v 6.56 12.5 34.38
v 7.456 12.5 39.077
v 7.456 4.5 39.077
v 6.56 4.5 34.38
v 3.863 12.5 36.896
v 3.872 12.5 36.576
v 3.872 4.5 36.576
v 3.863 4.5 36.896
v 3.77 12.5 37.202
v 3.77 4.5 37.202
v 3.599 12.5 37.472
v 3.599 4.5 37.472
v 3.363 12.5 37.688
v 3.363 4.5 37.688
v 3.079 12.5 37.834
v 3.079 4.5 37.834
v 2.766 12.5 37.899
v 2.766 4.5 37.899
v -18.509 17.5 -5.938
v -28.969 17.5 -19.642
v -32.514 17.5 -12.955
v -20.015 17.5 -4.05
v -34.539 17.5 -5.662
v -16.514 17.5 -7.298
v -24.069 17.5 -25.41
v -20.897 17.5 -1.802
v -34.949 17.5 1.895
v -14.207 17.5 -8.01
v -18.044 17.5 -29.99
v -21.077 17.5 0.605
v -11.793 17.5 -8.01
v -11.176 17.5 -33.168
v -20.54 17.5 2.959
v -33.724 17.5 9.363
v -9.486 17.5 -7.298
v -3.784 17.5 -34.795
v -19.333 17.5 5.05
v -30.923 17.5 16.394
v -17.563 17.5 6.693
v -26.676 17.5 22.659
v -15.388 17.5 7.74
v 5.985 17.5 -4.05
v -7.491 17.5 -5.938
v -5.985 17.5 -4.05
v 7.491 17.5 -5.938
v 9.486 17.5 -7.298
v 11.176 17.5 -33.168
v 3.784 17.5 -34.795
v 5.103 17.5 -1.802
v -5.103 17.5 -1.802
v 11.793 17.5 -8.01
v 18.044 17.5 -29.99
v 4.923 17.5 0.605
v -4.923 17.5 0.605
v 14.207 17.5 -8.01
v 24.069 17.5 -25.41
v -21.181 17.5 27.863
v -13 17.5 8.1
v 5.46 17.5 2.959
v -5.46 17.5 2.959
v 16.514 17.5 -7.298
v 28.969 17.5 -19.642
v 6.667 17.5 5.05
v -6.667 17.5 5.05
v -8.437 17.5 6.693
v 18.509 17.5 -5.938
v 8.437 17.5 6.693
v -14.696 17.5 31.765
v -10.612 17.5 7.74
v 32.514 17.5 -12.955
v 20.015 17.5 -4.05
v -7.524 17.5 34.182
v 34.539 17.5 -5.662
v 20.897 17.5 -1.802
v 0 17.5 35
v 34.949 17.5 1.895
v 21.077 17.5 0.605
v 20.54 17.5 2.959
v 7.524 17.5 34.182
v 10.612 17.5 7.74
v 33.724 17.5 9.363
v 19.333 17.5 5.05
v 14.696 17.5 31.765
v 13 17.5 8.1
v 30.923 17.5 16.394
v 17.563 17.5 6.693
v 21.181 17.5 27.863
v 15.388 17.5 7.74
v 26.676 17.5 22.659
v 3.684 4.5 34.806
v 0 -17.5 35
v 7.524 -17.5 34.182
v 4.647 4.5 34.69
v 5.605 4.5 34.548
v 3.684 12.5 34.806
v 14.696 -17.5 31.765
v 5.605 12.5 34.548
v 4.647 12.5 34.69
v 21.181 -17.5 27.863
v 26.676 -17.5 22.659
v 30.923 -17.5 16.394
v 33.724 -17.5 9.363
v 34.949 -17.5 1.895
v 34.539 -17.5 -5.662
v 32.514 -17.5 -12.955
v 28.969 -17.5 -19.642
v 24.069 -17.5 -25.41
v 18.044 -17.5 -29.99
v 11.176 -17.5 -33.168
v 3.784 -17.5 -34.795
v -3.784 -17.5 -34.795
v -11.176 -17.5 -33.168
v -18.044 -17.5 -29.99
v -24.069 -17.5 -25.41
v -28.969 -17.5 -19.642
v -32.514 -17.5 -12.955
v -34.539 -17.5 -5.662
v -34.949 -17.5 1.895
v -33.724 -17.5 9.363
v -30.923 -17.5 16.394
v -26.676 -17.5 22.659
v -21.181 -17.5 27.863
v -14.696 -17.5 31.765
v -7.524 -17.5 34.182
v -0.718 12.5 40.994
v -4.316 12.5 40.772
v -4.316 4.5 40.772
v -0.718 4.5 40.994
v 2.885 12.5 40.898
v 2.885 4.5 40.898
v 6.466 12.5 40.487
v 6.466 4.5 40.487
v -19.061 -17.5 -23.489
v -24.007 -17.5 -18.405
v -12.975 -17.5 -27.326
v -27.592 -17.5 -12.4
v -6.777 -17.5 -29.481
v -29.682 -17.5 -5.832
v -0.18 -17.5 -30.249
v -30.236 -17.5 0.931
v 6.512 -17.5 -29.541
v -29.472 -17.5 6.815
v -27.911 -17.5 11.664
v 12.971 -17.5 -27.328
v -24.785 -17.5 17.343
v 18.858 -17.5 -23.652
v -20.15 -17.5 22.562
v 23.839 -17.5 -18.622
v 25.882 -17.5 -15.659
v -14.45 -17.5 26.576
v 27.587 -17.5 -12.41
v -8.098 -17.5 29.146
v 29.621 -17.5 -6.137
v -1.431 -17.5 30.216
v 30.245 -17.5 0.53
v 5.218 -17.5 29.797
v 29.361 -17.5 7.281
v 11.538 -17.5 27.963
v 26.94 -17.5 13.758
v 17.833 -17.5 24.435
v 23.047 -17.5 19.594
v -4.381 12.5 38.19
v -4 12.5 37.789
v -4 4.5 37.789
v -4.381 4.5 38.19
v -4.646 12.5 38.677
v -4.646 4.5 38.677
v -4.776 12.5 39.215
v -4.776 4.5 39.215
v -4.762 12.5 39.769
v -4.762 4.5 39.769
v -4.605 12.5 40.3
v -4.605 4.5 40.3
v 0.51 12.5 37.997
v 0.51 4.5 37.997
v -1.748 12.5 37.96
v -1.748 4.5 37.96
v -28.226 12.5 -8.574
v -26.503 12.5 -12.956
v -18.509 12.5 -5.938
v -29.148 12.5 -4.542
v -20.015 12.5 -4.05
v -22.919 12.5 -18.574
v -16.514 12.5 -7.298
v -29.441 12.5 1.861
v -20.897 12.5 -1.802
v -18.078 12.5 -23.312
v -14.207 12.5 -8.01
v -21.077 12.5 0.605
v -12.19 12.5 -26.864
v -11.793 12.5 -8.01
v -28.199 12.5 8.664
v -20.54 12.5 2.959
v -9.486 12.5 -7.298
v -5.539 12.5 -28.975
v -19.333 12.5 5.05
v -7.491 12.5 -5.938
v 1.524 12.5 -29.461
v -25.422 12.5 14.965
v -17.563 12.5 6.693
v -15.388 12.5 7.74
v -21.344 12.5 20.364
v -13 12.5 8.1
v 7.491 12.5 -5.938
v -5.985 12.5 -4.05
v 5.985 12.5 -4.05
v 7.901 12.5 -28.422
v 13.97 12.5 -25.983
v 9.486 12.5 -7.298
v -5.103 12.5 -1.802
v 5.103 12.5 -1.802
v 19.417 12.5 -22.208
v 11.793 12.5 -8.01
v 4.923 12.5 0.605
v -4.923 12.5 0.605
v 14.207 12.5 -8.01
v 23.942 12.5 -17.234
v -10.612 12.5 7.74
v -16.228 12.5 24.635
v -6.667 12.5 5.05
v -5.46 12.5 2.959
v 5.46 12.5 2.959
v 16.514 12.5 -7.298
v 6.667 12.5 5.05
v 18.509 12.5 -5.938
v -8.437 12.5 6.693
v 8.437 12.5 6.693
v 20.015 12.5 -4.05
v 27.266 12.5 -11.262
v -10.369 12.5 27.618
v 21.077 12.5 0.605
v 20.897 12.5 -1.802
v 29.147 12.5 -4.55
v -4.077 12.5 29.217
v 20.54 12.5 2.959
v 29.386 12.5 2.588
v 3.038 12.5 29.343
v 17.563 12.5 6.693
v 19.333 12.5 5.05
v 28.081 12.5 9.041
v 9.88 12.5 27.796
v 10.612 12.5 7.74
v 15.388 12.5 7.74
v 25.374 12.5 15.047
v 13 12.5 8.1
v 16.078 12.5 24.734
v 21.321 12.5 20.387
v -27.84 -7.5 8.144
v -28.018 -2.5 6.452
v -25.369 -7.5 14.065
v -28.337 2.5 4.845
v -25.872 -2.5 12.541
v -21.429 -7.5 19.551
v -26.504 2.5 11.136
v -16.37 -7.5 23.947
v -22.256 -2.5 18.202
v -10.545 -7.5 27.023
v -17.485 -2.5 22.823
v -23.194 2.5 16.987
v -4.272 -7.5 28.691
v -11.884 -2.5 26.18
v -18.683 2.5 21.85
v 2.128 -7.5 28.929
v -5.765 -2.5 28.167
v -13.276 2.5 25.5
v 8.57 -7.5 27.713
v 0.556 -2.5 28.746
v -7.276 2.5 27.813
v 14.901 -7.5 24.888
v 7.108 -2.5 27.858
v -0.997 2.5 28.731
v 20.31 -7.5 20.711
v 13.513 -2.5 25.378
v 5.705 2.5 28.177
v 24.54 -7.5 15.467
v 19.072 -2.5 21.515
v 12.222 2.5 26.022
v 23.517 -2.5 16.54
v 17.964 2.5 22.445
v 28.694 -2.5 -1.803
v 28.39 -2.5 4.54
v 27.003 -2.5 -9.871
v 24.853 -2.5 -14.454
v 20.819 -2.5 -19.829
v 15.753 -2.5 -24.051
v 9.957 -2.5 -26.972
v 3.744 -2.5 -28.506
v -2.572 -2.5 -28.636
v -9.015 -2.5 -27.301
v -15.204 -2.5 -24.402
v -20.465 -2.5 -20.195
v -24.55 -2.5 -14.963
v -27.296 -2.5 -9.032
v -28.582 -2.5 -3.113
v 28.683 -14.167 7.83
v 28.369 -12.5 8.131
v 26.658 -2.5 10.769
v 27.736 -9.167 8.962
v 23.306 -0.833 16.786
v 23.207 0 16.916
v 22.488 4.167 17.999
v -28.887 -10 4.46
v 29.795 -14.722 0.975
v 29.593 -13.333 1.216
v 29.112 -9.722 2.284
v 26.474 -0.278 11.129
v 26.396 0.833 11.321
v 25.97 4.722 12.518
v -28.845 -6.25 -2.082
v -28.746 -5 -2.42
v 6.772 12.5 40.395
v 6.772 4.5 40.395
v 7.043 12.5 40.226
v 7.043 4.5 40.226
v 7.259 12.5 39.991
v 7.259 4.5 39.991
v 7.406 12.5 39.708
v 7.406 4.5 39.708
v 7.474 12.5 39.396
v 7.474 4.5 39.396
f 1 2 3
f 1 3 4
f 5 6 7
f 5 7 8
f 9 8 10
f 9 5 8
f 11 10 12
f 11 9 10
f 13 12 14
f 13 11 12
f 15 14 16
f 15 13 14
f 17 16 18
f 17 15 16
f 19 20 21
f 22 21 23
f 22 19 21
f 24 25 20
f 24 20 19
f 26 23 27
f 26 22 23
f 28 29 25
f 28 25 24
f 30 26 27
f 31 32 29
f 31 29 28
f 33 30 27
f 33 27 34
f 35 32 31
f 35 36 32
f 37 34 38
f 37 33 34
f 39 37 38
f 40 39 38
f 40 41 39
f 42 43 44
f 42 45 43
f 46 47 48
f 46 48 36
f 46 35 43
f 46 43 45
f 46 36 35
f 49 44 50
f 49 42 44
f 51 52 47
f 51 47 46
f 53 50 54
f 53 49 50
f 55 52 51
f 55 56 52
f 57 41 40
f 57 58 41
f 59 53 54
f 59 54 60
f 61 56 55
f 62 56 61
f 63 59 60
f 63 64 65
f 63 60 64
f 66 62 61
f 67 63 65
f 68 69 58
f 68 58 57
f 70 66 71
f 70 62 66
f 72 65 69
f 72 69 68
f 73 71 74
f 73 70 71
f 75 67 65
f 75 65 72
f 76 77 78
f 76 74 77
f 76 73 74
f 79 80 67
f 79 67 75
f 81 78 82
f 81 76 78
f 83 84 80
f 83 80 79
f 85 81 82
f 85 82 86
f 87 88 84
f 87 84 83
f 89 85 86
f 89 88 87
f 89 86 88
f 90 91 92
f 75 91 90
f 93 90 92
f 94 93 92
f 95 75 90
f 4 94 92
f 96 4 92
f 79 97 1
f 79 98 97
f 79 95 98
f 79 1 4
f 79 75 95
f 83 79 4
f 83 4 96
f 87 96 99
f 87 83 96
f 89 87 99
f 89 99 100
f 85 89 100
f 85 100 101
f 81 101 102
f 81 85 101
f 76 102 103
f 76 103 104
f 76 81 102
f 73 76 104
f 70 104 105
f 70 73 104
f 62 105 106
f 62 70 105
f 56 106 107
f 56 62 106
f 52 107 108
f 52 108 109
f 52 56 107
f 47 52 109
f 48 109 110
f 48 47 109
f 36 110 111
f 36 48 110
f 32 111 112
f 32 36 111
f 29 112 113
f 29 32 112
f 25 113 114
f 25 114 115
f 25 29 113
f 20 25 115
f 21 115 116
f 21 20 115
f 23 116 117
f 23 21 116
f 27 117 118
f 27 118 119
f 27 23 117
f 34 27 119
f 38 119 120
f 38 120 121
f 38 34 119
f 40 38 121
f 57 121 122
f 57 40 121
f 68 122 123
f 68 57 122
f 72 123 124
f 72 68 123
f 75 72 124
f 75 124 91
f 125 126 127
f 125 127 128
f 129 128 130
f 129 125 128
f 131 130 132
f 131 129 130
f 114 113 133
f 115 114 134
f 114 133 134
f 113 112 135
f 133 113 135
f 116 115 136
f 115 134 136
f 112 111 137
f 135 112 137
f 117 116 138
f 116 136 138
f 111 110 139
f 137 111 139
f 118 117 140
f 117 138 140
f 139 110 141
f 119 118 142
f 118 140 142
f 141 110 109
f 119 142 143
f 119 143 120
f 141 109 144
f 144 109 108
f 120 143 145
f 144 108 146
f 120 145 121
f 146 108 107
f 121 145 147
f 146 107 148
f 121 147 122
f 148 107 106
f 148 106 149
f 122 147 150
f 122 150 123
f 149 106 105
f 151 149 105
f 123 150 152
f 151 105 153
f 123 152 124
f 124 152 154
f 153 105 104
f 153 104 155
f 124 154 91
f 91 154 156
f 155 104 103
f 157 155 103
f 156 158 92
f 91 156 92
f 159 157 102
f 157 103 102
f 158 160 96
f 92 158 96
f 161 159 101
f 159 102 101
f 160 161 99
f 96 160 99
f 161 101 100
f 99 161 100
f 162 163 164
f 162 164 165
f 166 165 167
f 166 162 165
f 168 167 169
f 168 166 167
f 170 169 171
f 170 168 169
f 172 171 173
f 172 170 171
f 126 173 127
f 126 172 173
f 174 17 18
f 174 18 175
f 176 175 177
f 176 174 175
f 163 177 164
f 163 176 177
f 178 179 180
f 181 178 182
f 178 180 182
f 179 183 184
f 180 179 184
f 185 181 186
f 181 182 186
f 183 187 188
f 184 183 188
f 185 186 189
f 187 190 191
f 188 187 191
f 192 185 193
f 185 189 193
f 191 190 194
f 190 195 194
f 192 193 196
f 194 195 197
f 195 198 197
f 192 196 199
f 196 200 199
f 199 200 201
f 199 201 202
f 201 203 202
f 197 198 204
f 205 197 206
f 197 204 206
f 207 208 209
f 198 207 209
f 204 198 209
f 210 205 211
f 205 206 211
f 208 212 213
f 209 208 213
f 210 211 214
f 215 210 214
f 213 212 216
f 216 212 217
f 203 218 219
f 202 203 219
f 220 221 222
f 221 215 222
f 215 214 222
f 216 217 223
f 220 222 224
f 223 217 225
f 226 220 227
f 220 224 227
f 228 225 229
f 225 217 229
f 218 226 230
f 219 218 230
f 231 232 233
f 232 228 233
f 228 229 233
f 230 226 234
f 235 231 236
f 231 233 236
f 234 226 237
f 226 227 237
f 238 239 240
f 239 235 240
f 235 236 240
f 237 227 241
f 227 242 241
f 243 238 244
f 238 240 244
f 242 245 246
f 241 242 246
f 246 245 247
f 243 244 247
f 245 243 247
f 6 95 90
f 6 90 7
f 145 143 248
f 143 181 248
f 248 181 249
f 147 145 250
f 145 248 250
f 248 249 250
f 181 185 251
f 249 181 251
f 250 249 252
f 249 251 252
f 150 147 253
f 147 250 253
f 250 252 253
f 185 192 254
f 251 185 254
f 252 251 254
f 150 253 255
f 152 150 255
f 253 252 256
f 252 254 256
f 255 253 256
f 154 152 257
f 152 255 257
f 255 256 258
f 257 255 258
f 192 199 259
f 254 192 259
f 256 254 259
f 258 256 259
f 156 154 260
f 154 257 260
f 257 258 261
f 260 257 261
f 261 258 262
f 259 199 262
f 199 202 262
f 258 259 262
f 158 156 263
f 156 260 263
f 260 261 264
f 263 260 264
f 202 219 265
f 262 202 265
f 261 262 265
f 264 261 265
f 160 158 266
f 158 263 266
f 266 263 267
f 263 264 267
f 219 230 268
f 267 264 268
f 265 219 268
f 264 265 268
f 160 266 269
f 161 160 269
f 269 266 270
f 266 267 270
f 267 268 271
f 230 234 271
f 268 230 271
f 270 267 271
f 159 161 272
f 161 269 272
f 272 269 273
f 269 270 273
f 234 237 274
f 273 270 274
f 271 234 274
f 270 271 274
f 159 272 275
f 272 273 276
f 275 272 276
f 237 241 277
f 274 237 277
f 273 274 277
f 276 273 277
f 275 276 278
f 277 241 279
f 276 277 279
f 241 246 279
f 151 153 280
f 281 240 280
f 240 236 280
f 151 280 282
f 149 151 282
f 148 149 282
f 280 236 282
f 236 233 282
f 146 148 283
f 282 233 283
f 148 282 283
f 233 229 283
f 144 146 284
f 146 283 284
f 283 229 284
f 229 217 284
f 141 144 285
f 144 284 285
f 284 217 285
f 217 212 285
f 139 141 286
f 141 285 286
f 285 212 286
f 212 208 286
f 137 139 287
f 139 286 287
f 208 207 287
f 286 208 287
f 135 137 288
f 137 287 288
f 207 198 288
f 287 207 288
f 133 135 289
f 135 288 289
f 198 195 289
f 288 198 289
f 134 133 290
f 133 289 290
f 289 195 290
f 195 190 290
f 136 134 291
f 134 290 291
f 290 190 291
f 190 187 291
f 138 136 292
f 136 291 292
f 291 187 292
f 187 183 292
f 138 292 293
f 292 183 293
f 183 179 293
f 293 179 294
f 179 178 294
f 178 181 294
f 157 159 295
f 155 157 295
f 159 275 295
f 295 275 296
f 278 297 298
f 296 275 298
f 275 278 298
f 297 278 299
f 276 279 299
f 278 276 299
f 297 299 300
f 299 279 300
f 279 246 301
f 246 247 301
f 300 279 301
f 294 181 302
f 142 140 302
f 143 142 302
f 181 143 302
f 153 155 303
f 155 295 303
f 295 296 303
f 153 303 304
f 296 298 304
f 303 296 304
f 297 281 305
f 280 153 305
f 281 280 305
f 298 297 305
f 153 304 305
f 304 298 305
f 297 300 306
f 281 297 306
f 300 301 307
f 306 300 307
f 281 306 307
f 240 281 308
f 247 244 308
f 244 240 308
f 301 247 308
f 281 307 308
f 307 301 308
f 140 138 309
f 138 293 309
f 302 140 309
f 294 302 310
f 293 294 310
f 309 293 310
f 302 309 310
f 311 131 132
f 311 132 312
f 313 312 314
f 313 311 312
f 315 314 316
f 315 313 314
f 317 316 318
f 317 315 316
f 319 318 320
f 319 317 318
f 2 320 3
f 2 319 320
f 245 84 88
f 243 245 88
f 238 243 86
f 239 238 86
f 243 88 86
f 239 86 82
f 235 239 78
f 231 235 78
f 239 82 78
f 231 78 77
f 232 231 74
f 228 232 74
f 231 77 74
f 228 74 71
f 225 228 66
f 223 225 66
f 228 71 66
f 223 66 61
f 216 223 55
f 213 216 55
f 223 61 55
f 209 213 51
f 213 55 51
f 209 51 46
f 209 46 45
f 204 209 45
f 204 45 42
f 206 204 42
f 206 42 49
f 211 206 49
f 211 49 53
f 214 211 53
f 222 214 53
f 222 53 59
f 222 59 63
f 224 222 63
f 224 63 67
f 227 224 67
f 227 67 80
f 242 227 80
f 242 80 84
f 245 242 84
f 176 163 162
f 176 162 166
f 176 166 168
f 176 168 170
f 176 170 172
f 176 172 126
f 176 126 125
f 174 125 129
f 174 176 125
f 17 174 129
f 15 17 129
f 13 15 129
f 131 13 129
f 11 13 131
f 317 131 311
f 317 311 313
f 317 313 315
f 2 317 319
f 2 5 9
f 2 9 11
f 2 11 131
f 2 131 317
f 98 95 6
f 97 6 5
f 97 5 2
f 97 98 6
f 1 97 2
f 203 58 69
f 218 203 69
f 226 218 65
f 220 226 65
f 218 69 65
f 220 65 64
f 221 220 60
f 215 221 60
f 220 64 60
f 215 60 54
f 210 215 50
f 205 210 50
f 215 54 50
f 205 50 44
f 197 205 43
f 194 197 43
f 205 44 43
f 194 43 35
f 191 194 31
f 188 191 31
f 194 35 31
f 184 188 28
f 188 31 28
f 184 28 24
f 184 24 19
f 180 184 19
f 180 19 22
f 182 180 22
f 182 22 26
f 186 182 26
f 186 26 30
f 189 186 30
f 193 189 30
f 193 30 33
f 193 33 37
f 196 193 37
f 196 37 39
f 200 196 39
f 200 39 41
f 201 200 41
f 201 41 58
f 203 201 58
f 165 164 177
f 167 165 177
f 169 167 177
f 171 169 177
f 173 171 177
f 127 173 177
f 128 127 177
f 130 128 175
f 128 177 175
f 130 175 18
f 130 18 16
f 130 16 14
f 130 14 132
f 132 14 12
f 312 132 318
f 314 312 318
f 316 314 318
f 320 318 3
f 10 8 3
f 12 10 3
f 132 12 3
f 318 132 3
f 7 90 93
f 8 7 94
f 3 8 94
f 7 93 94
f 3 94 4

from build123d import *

# Parameters (mm, degrees)
ESBO_O1_R                = 35
RESSALTO_EXTRUS_O1_DEPTH = 17.5
ESBO_O2_R                = 8.1
CORTE_EXTRUS_O1_DEPTH    = 61.621778265
RESSALTO_EXTRUS_O2_DEPTH = 8


with BuildPart() as part:
    # Esboço1 → Ressalto-extrusão1 (new, symmetric)
    with BuildSketch(Plane(origin=(0, 0, 0), x_dir=(1, 0, 0), z_dir=(0, 1, 0))):
        with Locations(Location((0, 0, 0), (0, 0, 270))):
            Circle(ESBO_O1_R)
    extrude(amount=RESSALTO_EXTRUS_O1_DEPTH, both=True)

    # Esboço2 → Corte-extrusão1 (cut, through all)
    with BuildSketch(Plane(origin=(0, 17.5, 0), x_dir=(1, 0, 0), z_dir=(0, 1, 0))):
        with Locations(Location((-13, 0, 0), (0, 0, 270))):
            Circle(ESBO_O2_R)
        with Locations(Location((13, 0, 0), (0, 0, 270))):
            Circle(ESBO_O2_R)
    extrude(amount=-CORTE_EXTRUS_O1_DEPTH, mode=Mode.SUBTRACT)

    # Loft de corte1: read off the stored shape, not the designer's step
    # Loft de corte1: loft between two sections, ruled curve by curve
    loft_de_corte1_from = [
        Edge.make_bspline([(-27.910850381, -17.5, 11.663915766), (-4.583018848, -17.5, 67.485616529), (51.238681914, -17.5, 44.157784996), (27.910850381, -17.5, -11.663915766), (4.583018848, -17.5, -67.485616529), (-51.238681914, -17.5, -44.157784996), (-27.910850381, -17.5, 11.663915766)], [0, 0, 0, 0, 0.5, 0.5, 0.5, 1, 1, 1, 1], 3, [1, 0.333333333, 0.333333333, 1, 0.333333333, 0.333333333, 1]),
    ]
    loft_de_corte1_to = [
        Edge.make_bspline([(-29.148312313, 12.5, -4.54157344), (-38.231459193, 12.5, 53.755051185), (20.065165432, 12.5, 62.838198066), (29.148312313, 12.5, 4.54157344), (38.231459193, 12.5, -53.755051185), (-20.065165432, 12.5, -62.838198066), (-29.148312313, 12.5, -4.54157344)], [0, 0, 0, 0, 0.5, 0.5, 0.5, 1, 1, 1, 1], 3, [1, 0.333333333, 0.333333333, 1, 0.333333333, 0.333333333, 1]),
    ]
    loft_de_corte1 = Solid(Shell([*[Face.make_surface_from_curves(loft_de_corte1_from[k], loft_de_corte1_to[k]) for k in range(1)], Face(Wire(loft_de_corte1_from)), Face(Wire(loft_de_corte1_to))]))
    add(loft_de_corte1, mode=Mode.SUBTRACT)

    # Esboço6 → Ressalto-extrusão2 (add)
    with BuildSketch(Plane(origin=(0, 12.5, 0), x_dir=(1, 0, 0), z_dir=(0, 1, 0))):
        with BuildLine():
            ThreePointArc((6.466441324, -40.486851404), (7.259420992, -39.991219283), (7.455915524, -39.076966664))
            Line((7.455915524, -39.076966664), (6.559691913, -34.379797004))
            ThreePointArc((6.559691913, -34.379797004), (5.126373139, -34.622540323), (3.684210526, -34.805554051))
            Line((3.684210526, -34.805554051), (3.871624166, -36.576092278))
            ThreePointArc((3.871624166, -36.576092278), (3.598996432, -37.472019199), (2.765626457, -37.899225722))
            ThreePointArc((2.765626457, -37.899225722), (-0.619647606, -37.994947517), (-4, -37.788887255))
            ThreePointArc((-4, -37.788887255), (-4.775763274, -39.215151716), (-4.315789474, -40.77222046))
            ThreePointArc((-4.315789474, -40.77222046), (1.084750995, -40.985647674), (6.466441324, -40.486851404))
        make_face()
    extrude(amount=-RESSALTO_EXTRUS_O2_DEPTH)


solid = part.part
